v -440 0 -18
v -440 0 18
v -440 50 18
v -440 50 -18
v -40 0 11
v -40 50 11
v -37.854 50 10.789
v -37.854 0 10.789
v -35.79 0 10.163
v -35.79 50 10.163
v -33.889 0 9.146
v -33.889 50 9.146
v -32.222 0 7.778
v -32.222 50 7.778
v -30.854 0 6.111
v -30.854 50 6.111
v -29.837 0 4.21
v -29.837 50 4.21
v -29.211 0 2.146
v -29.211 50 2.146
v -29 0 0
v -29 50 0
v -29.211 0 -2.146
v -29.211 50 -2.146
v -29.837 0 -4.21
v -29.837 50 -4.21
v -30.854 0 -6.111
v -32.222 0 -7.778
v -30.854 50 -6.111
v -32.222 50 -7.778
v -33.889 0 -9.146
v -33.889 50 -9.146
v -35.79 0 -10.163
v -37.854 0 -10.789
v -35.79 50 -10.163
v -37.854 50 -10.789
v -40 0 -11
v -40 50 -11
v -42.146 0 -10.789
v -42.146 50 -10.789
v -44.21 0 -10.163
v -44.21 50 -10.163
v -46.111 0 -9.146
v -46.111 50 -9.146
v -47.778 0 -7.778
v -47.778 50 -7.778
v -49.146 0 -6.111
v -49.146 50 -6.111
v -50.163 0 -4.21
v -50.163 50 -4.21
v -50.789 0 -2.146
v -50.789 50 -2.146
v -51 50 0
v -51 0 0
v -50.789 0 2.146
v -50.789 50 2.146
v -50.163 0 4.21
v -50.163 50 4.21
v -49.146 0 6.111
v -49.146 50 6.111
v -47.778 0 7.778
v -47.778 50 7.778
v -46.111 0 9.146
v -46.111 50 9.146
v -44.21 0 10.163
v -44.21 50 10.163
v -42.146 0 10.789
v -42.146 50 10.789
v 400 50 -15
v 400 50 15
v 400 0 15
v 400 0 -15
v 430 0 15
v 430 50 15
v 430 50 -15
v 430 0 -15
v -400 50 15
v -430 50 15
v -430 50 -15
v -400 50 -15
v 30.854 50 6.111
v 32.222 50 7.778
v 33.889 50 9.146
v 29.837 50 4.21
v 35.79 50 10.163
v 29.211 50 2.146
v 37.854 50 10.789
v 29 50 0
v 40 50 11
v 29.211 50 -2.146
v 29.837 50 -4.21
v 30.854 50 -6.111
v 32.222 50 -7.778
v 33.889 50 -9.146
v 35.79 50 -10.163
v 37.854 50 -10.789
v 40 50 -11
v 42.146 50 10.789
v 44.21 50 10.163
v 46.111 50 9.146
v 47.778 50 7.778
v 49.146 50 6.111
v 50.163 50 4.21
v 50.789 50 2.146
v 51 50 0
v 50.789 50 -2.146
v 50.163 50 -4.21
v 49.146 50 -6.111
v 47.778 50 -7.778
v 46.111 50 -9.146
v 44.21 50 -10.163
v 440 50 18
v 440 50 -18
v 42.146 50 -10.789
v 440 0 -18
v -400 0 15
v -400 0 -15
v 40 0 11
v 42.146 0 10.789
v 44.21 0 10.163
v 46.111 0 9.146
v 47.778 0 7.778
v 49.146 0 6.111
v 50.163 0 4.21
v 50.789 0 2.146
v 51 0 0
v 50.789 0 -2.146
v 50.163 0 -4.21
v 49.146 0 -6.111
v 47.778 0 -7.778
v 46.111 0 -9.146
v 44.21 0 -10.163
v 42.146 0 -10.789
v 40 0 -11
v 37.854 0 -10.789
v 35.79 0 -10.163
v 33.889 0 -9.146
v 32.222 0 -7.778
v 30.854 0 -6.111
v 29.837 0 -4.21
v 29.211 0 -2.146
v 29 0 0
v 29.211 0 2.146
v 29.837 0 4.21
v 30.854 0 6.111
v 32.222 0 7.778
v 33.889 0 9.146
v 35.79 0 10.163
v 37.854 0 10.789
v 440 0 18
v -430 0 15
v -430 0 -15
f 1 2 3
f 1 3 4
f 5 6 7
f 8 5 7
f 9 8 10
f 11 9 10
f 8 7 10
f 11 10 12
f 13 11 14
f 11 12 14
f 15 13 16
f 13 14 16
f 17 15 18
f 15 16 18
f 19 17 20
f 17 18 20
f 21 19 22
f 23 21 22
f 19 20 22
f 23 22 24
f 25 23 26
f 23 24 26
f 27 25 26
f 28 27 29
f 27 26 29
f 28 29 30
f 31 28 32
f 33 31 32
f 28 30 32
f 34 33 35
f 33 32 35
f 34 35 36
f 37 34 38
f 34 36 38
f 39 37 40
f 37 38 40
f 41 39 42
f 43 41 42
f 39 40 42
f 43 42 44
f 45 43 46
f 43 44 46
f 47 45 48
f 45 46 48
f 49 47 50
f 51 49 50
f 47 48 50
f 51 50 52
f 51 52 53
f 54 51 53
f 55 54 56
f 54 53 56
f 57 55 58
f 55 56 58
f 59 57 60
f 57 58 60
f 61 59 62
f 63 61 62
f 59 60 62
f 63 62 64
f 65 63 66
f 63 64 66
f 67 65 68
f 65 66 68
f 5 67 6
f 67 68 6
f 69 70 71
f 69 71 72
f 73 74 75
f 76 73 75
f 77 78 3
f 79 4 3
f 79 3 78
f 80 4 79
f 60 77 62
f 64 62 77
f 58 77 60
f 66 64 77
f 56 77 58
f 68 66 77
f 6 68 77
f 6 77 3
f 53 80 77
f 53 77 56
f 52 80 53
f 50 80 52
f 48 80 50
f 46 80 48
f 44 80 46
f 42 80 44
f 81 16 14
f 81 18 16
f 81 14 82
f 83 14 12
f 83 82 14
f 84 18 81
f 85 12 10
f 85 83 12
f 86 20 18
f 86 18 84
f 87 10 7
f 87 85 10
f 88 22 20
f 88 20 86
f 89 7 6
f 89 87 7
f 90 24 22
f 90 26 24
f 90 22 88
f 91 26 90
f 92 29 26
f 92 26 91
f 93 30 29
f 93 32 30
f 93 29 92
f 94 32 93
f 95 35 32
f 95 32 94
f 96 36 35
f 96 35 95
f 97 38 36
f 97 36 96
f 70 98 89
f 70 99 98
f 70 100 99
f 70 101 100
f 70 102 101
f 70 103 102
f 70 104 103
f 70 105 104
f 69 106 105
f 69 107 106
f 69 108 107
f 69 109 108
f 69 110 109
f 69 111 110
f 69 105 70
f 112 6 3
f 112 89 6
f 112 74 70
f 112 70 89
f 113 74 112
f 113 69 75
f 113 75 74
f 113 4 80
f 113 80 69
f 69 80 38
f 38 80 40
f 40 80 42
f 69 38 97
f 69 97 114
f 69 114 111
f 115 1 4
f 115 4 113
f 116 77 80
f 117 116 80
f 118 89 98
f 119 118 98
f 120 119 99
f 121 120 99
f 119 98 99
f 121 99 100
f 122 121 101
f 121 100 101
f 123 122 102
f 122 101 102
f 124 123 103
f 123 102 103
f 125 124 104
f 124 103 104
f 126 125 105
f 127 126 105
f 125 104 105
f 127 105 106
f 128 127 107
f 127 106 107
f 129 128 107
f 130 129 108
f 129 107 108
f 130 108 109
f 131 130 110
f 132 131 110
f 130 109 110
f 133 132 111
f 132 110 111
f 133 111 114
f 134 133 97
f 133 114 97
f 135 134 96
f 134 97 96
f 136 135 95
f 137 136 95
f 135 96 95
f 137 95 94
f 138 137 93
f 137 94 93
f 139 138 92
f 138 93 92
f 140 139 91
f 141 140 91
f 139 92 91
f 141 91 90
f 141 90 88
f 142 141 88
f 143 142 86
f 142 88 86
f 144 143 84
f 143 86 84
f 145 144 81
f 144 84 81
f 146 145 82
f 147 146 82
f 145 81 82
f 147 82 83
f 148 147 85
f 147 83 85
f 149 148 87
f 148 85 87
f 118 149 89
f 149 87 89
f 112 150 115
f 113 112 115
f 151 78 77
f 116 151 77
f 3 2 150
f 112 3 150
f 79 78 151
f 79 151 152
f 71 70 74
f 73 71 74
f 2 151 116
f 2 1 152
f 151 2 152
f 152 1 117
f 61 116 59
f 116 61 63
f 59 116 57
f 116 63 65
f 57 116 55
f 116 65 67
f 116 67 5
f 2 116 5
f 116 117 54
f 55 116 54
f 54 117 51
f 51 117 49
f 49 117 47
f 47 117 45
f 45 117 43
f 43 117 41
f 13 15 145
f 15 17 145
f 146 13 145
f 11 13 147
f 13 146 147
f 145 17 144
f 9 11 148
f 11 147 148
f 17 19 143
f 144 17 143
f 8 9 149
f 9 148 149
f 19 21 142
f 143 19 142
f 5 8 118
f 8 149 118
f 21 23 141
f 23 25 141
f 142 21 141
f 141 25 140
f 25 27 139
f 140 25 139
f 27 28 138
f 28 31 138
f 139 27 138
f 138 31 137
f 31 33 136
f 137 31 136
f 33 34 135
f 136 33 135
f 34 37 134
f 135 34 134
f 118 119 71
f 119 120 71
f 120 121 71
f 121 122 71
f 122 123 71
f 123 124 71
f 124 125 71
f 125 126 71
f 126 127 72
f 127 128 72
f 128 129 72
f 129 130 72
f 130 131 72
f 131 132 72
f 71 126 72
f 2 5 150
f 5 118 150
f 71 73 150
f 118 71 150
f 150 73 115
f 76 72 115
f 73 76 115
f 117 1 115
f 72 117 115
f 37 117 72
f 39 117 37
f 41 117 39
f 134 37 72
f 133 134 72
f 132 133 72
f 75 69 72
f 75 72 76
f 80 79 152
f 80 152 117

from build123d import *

# Parameters (mm, degrees)
SKETCH1_W           = 880
SKETCH1_H           = 36
BOSS_EXTRUDE1_DEPTH = 50
SKETCH2_W           = 30
SKETCH2_H           = 30
CUT_EXTRUDE1_DEPTH  = 50
SKETCH3_R           = 11
CUT_EXTRUDE2_DEPTH  = 50


with BuildPart() as part:
    # Sketch1 → Boss-Extrude1 (new body)
    with BuildSketch(Plane(origin=(0, 0, 0), x_dir=(1, 0, 0), z_dir=(0, 1, 0))):
        Rectangle(SKETCH1_W, SKETCH1_H)
    extrude(amount=BOSS_EXTRUDE1_DEPTH)

    # Sketch2 → Cut-Extrude1 (cut)
    with BuildSketch(Plane(origin=(0, 50, 0), x_dir=(1, 0, 0), z_dir=(0, 1, 0))):
        with Locations((-415, 0)):
            Rectangle(SKETCH2_W, SKETCH2_H)
        with Locations((415, 0)):
            Rectangle(SKETCH2_W, SKETCH2_H)
    extrude(amount=-CUT_EXTRUDE1_DEPTH, mode=Mode.SUBTRACT)

    # Sketch3 → Cut-Extrude2 (cut)
    with BuildSketch(Plane(origin=(0, 50, 0), x_dir=(1, 0, 0), z_dir=(0, 1, 0))):
        with Locations(Location((-40, 0, 0), (0, 0, 270))):
            Circle(SKETCH3_R)
        with Locations(Location((40, 0, 0), (0, 0, 270))):
            Circle(SKETCH3_R)
    extrude(amount=-CUT_EXTRUDE2_DEPTH, mode=Mode.SUBTRACT)


solid = part.part
